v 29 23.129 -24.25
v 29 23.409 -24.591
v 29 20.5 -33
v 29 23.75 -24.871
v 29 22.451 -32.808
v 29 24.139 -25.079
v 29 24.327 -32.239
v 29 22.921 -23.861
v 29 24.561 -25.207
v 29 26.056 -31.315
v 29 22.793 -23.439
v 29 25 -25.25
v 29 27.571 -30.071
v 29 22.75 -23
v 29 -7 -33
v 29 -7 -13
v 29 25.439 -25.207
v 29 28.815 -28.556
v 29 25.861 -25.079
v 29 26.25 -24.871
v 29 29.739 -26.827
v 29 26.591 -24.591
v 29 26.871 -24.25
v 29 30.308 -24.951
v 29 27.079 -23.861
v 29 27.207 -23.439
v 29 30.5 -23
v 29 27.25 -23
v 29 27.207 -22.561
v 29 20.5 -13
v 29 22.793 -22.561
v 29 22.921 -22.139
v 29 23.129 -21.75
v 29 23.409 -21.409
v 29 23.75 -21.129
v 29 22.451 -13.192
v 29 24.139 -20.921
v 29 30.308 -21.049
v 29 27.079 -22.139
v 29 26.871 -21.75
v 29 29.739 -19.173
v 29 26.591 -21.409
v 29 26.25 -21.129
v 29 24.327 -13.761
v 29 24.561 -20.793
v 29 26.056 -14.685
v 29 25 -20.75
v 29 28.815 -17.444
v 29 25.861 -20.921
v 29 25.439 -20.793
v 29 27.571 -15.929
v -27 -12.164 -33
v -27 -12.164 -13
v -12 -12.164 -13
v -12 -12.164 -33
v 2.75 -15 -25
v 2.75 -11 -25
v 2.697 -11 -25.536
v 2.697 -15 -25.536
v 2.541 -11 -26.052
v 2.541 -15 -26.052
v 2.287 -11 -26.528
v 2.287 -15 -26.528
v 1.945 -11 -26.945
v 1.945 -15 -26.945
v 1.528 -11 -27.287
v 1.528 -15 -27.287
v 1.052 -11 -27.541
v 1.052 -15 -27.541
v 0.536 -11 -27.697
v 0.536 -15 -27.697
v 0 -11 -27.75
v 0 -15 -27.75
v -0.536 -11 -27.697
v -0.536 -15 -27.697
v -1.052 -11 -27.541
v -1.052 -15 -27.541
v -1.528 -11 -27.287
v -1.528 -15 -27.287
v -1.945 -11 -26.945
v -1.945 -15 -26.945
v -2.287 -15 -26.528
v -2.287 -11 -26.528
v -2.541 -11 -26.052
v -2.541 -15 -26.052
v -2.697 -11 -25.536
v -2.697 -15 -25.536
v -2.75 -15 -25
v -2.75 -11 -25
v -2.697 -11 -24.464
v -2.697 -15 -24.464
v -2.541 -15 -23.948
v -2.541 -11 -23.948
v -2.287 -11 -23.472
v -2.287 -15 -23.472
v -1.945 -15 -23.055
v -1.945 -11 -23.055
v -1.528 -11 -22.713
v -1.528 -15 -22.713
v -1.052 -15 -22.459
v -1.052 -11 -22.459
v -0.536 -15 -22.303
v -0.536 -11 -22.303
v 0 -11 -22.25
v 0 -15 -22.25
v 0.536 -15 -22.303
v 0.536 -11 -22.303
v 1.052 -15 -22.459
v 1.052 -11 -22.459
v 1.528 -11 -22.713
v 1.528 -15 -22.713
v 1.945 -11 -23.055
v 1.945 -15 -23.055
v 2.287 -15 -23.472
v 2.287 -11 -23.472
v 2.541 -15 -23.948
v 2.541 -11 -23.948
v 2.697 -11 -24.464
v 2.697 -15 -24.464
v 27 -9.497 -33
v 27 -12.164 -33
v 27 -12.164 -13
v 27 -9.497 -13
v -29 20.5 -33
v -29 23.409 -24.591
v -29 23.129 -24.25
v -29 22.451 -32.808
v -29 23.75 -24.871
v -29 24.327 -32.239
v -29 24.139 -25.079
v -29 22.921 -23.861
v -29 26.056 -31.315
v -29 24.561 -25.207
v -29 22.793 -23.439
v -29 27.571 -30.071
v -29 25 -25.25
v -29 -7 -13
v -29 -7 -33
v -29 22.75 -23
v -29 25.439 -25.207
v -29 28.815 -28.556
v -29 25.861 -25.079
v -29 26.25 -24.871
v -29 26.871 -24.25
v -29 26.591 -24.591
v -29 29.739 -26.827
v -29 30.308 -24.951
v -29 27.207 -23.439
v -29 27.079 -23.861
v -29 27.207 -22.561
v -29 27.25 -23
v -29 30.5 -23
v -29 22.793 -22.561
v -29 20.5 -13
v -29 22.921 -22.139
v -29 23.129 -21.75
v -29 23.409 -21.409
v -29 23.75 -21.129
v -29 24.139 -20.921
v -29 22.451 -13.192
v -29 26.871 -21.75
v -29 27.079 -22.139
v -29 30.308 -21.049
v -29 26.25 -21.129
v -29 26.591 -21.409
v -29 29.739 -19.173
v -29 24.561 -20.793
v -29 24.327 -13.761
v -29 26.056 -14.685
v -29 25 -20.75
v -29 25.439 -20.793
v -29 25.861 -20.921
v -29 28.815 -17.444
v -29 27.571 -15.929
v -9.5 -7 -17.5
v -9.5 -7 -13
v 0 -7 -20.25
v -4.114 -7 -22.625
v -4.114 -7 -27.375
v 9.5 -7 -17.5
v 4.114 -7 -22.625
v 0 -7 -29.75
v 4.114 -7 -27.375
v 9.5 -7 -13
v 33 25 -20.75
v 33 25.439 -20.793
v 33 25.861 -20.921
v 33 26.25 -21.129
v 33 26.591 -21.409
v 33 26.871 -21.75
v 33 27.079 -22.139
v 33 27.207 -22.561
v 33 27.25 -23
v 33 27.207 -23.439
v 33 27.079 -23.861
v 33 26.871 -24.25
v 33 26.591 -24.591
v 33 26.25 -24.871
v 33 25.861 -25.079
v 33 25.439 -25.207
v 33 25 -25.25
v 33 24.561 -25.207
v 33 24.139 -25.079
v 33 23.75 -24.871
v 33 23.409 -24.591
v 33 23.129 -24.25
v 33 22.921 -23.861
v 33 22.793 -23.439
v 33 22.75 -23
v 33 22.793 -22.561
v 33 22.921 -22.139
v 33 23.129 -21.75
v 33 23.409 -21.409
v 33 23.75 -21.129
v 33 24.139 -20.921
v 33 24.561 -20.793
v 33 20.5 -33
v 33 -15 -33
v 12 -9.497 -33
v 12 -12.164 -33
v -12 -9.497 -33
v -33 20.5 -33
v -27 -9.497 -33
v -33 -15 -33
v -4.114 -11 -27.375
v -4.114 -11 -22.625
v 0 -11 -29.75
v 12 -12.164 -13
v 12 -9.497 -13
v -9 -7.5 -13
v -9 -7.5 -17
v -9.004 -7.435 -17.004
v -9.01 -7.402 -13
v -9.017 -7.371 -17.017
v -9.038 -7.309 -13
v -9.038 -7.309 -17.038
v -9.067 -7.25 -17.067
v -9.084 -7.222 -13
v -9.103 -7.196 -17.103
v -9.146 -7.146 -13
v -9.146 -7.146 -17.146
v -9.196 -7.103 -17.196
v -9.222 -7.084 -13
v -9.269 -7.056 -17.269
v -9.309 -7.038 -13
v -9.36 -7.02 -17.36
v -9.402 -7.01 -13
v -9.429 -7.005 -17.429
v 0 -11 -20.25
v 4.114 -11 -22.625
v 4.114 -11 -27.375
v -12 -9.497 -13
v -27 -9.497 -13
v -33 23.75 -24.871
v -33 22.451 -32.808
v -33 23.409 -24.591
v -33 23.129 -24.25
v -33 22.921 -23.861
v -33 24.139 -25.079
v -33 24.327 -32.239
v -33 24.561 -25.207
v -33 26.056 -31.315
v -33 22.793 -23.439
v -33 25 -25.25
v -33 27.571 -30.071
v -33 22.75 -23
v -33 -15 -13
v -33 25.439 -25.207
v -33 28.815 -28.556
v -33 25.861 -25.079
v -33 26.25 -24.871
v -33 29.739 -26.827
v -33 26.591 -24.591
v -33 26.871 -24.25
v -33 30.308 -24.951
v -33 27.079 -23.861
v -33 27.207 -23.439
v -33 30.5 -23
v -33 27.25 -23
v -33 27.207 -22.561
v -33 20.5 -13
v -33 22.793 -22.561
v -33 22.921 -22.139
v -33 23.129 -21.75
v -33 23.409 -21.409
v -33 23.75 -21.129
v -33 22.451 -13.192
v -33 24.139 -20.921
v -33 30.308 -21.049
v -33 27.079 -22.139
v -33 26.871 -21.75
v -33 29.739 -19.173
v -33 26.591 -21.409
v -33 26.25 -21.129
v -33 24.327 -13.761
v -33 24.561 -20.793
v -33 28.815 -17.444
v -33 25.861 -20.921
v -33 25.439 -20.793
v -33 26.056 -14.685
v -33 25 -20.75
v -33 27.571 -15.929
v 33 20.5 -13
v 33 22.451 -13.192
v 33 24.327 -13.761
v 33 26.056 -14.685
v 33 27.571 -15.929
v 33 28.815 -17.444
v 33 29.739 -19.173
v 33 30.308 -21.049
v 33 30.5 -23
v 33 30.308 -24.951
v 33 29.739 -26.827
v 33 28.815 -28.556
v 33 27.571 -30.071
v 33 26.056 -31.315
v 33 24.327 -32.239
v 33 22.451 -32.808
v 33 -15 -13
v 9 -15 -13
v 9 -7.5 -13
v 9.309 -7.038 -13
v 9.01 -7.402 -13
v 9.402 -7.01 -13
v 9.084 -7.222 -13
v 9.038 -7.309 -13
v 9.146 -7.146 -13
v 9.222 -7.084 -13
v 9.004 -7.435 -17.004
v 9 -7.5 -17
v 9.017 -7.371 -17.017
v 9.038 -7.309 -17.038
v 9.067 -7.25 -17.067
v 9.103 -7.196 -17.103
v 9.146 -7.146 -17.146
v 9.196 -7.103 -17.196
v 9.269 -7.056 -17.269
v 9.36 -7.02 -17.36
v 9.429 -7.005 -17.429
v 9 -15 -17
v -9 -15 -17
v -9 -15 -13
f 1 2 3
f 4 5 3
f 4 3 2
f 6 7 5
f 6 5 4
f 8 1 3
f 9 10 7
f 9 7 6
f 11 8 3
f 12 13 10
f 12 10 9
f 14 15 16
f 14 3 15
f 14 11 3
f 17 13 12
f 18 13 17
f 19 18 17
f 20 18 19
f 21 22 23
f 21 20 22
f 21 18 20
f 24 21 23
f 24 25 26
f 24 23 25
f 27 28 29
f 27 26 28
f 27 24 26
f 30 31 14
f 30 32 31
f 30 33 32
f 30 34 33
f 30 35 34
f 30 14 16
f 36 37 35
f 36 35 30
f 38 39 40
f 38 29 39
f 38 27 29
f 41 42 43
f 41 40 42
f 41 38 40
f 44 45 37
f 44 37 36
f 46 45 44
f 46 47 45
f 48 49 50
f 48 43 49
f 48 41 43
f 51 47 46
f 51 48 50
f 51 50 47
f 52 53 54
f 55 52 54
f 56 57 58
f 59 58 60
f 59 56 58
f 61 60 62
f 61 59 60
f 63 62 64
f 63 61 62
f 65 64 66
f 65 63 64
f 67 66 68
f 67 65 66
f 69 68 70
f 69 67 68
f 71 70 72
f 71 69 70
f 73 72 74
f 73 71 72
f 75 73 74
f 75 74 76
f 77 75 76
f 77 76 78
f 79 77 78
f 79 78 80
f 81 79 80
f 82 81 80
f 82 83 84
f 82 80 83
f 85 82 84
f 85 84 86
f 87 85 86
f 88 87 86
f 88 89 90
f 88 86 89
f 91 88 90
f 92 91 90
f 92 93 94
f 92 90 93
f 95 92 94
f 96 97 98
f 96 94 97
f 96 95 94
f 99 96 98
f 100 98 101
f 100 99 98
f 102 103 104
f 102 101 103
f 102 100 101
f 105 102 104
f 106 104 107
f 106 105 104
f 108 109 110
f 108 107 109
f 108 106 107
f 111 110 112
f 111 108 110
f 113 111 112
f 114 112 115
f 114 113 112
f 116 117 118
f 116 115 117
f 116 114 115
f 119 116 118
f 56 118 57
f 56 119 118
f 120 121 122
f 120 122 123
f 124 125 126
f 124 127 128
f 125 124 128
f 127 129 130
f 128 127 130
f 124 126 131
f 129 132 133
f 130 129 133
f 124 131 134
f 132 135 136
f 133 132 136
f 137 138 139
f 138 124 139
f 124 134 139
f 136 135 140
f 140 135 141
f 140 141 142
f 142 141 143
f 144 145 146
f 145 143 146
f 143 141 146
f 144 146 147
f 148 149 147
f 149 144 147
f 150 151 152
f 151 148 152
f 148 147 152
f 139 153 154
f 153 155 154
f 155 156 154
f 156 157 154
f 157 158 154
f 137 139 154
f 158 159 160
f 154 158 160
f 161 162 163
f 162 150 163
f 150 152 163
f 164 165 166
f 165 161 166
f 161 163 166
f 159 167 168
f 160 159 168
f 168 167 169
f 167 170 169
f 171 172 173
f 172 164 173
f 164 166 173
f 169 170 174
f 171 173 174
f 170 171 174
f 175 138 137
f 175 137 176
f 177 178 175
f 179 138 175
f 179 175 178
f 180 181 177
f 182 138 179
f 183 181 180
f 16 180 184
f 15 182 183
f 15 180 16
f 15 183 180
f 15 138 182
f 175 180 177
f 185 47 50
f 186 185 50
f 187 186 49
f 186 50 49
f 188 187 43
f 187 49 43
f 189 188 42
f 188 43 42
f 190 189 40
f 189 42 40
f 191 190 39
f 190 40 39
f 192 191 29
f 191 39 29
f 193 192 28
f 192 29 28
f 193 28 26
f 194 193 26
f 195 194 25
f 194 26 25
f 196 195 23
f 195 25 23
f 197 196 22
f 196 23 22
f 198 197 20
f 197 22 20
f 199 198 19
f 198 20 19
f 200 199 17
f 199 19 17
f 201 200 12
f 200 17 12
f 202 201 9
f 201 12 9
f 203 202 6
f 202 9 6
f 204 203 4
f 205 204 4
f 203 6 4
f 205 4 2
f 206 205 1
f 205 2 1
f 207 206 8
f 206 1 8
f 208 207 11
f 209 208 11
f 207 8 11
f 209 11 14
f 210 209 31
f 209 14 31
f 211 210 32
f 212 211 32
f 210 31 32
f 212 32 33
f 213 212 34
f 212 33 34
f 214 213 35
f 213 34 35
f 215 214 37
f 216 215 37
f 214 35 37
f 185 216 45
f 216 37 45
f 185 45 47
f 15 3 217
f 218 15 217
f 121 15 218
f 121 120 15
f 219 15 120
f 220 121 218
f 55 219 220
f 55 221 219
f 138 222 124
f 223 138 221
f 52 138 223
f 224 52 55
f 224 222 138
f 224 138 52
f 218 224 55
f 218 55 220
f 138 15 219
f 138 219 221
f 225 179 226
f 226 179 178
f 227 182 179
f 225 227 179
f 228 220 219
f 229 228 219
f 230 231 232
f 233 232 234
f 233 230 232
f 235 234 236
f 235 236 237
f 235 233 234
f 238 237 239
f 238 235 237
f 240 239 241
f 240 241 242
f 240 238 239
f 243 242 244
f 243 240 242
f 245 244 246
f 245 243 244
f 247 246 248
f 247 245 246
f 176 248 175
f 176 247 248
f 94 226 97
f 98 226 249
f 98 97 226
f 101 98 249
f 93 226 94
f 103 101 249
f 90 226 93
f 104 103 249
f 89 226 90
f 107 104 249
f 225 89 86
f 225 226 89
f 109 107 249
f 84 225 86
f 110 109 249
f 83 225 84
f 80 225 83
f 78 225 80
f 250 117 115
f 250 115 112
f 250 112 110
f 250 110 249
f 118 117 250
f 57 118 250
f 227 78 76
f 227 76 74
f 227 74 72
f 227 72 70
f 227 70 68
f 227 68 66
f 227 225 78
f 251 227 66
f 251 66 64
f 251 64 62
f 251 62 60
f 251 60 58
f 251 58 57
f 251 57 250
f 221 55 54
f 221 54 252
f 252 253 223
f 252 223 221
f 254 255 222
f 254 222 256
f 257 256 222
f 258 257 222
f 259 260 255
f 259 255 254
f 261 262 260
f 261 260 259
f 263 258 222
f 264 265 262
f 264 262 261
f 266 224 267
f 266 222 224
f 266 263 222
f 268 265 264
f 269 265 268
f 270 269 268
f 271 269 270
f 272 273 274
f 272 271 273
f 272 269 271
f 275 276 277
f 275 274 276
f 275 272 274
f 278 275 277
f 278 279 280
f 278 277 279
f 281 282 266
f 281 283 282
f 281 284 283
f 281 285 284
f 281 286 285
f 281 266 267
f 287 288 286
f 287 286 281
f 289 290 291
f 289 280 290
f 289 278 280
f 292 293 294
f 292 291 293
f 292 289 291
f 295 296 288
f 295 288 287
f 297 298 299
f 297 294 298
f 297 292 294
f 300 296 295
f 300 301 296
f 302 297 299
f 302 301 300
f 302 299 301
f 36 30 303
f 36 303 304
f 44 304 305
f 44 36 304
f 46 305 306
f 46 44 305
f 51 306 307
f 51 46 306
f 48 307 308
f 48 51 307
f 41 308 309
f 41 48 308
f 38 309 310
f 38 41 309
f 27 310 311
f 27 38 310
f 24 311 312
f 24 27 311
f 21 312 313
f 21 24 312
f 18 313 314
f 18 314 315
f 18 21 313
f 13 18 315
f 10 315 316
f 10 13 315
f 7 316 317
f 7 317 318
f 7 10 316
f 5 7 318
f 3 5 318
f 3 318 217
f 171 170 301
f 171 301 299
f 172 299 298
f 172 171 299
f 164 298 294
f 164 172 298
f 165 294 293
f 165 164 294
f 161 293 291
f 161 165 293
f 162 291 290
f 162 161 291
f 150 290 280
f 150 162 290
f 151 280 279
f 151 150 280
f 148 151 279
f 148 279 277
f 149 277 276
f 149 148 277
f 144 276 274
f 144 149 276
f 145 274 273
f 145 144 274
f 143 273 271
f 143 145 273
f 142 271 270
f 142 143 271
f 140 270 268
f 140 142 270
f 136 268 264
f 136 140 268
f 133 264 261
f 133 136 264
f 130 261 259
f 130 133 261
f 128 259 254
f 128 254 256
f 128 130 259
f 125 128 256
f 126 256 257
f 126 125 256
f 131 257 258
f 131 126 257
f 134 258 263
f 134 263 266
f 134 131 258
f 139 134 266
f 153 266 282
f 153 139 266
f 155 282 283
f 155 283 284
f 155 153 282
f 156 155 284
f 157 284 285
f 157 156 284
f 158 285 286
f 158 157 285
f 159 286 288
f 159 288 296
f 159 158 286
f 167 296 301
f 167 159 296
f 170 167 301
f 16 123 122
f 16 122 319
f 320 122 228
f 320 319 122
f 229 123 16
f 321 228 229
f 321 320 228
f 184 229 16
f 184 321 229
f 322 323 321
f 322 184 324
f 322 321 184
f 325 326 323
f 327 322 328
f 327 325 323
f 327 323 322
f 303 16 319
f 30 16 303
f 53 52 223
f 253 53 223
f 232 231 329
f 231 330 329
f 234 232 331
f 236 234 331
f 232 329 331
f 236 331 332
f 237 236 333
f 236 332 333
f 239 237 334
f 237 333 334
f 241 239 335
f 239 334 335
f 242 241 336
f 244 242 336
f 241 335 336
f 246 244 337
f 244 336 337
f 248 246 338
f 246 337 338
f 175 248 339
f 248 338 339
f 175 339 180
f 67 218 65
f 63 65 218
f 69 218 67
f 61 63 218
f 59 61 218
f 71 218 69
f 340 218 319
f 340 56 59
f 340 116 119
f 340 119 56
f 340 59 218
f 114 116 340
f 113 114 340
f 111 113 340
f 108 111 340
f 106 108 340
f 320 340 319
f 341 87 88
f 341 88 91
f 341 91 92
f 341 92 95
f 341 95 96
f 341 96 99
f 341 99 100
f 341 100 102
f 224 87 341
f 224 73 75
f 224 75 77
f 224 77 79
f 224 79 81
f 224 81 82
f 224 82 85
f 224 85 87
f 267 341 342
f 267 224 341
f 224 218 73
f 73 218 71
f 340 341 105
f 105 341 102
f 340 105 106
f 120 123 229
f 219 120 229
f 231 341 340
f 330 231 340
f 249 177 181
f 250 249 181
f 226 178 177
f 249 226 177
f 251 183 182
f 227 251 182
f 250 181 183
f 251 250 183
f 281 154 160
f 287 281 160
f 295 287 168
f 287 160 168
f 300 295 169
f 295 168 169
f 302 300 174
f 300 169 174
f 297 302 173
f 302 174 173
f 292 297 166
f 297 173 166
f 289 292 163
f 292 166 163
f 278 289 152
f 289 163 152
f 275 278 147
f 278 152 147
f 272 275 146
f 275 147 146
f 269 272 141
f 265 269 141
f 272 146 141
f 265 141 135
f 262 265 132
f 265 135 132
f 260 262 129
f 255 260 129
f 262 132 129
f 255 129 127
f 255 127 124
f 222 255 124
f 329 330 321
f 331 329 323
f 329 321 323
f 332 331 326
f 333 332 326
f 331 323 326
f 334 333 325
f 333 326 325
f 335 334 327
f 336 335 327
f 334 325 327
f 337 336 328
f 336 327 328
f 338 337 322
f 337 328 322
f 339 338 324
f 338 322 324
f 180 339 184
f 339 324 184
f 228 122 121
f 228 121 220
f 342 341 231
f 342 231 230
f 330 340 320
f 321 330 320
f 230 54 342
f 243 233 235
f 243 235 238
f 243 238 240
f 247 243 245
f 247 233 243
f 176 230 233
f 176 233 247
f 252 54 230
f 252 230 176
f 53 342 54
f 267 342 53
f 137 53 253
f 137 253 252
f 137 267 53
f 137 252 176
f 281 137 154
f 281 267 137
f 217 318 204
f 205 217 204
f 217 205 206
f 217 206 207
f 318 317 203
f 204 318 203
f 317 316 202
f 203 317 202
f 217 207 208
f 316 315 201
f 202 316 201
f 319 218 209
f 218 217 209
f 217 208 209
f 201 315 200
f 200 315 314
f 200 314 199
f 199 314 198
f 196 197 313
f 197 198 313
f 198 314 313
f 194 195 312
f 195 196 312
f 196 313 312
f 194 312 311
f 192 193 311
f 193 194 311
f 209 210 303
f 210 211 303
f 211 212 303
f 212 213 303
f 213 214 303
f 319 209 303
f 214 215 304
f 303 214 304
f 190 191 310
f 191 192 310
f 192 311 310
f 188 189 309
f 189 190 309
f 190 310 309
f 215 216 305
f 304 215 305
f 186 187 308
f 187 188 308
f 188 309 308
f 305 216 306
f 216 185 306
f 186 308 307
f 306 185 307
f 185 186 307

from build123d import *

# Parameters (mm, degrees)
SKETCH005_W             = 58
SKETCH005_H             = 20
SKETCH005_R             = 2.75
PAD004_DEPTH            = 8
SKETCH006_R             = 2.25
PAD005_DEPTH            = 4
POCKET005_DEPTH         = 4
SKETCH011_W             = 15
SKETCH011_H             = 2.666667
POCKET007_DEPTH         = 20
SKETCH012_W             = 18
SKETCH012_H             = 4
POCKET008_DEPTH         = 8
FILLET_R                = 0.5
BODY002_PLACEMENT_ANGLE = 180


with BuildPart() as part:
    # Sketch005 → Pad004 (new body)
    with BuildSketch(Plane.XZ):
        Rectangle(SKETCH005_W, SKETCH005_H)
        with Locations((0, 2)):
            Circle(SKETCH005_R, mode=Mode.SUBTRACT)
    extrude(amount=PAD004_DEPTH)

    # Sketch006 (on Face4 of Pad004) → Pad005 (join)
    with BuildSketch(Plane(origin=(-29, 0, 0), x_dir=(0, 0, -1), z_dir=(-1, 0, 0))):
        with BuildLine():
            Line((-10, 0), (10, 0))
            Line((10, 0), (10, 35.5))
            ThreePointArc((10, 35.5), (0, 45.5), (-10, 35.5))
            Line((-10, 35.5), (-10, 0))
        make_face()
        with Locations((0, 40)):
            Circle(SKETCH006_R, mode=Mode.SUBTRACT)
    pad005 = extrude(amount=PAD005_DEPTH)

    # Mirrored003: Pad005 across YZ
    add(pad005.mirror(Plane.YZ))

    # Sketch007 (on Face5 of Mirrored003) → Pocket005 (cut)
    with BuildSketch(Plane.XZ.offset(8)):
        Polygon((4.113621, 4.375), (0, 6.75), (-4.113621, 4.375), (-4.113621, -0.375), (0, -2.75), (4.113621, -0.375), align=None)
    extrude(amount=-POCKET005_DEPTH, mode=Mode.SUBTRACT)

    # Sketch011 (on Face14 of Pocket005) → Pocket007 (cut)
    with BuildSketch(Plane(origin=(0, 0, 10), x_dir=(-1, 0, 0), z_dir=(0, 0, 1))):
        with Locations((-19.5, 4.169504)):
            Rectangle(SKETCH011_W, SKETCH011_H)
    pocket007 = extrude(amount=-POCKET007_DEPTH, mode=Mode.SUBTRACT)

    # Mirrored004: Pocket007 across YZ
    add(pocket007.mirror(Plane.YZ), mode=Mode.SUBTRACT)

    # Sketch012 (on Face3 of Mirrored004) → Pocket008 (cut)
    with BuildSketch(Plane(origin=(0, 0, 0), x_dir=(1, 0, 0), z_dir=(0, 1, 0))):
        with Locations((0, 8)):
            Rectangle(SKETCH012_W, SKETCH012_H)
    extrude(amount=-POCKET008_DEPTH, mode=Mode.SUBTRACT)

    # Fillet
    fillet_edges = [part.edges().sort_by_distance(p)[0] for p in [
        (0, -8, -6),
        (9, -8, -8),
        (-9, -8, -8),
    ]]
    fillet(fillet_edges, radius=FILLET_R)


with BuildPart() as part_1:
    # Body002 placement: moved
    add(part.part.moved(Location((0, -15, -23))).rotate(Axis((0, -15, -23), (1, 0, 0)), BODY002_PLACEMENT_ANGLE))


solid = part_1.part
